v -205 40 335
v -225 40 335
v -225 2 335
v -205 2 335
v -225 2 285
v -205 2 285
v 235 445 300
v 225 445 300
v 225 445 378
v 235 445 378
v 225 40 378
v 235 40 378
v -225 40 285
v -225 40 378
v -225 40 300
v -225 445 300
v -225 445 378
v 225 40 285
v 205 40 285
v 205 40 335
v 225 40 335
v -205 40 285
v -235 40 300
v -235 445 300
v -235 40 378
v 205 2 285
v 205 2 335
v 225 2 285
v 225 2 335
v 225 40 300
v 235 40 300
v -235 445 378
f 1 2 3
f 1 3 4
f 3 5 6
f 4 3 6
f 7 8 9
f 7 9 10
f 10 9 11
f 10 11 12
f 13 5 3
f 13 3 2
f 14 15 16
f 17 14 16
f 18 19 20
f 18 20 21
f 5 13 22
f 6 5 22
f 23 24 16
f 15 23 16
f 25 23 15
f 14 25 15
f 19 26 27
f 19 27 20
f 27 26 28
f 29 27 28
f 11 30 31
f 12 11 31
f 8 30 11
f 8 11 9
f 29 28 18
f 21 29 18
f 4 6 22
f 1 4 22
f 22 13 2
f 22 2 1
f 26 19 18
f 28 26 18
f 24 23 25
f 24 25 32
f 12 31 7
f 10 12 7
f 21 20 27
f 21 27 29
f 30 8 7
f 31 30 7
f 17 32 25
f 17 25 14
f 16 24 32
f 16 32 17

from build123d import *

# Parameters (mm, degrees)
WALL_MOUNT_RAIL_ASSUMED_START = 300
SKETCH1_W                     = 10
SKETCH1_H                     = 405
WALL_MOUNT_RAIL_ASSUMED_DEPTH = 78
BOSS_EXTRUDE2_START           = 300
SKETCH2_W                     = 10
SKETCH2_H                     = 405
BOSS_EXTRUDE2_DEPTH           = 78
RADIATOR_FOOT_ASSUMED_START   = 285
SKETCH3_W                     = 20
SKETCH3_H                     = 38
RADIATOR_FOOT_ASSUMED_DEPTH   = 50
BOSS_EXTRUDE4_START           = 285
SKETCH4_W                     = 20
SKETCH4_H                     = 38
BOSS_EXTRUDE4_DEPTH           = 50


with BuildPart() as part:
    # Sketch1 → Wall_mount_rail_ASSUMED (new body)
    with BuildSketch(Plane.XY.offset(WALL_MOUNT_RAIL_ASSUMED_START)):
        with Locations((-230, 242.5)):
            Rectangle(SKETCH1_W, SKETCH1_H)
    extrude(amount=WALL_MOUNT_RAIL_ASSUMED_DEPTH)


with BuildPart() as body_2:
    # Sketch2 → Boss-Extrude2 (new body)
    with BuildSketch(Plane.XY.offset(BOSS_EXTRUDE2_START)):
        with Locations((230, 242.5)):
            Rectangle(SKETCH2_W, SKETCH2_H)
    extrude(amount=BOSS_EXTRUDE2_DEPTH)


with BuildPart() as body_3:
    # Sketch3 → Radiator_foot_ASSUMED (new body)
    with BuildSketch(Plane.XY.offset(RADIATOR_FOOT_ASSUMED_START)):
        with Locations((-215, 21)):
            Rectangle(SKETCH3_W, SKETCH3_H)
    extrude(amount=RADIATOR_FOOT_ASSUMED_DEPTH)


with BuildPart() as body_4:
    # Sketch4 → Boss-Extrude4 (new body)
    with BuildSketch(Plane.XY.offset(BOSS_EXTRUDE4_START)):
        with Locations((215, 21)):
            Rectangle(SKETCH4_W, SKETCH4_H)
    extrude(amount=BOSS_EXTRUDE4_DEPTH)


solid = Compound([part.part, body_2.part, body_3.part, body_4.part])
